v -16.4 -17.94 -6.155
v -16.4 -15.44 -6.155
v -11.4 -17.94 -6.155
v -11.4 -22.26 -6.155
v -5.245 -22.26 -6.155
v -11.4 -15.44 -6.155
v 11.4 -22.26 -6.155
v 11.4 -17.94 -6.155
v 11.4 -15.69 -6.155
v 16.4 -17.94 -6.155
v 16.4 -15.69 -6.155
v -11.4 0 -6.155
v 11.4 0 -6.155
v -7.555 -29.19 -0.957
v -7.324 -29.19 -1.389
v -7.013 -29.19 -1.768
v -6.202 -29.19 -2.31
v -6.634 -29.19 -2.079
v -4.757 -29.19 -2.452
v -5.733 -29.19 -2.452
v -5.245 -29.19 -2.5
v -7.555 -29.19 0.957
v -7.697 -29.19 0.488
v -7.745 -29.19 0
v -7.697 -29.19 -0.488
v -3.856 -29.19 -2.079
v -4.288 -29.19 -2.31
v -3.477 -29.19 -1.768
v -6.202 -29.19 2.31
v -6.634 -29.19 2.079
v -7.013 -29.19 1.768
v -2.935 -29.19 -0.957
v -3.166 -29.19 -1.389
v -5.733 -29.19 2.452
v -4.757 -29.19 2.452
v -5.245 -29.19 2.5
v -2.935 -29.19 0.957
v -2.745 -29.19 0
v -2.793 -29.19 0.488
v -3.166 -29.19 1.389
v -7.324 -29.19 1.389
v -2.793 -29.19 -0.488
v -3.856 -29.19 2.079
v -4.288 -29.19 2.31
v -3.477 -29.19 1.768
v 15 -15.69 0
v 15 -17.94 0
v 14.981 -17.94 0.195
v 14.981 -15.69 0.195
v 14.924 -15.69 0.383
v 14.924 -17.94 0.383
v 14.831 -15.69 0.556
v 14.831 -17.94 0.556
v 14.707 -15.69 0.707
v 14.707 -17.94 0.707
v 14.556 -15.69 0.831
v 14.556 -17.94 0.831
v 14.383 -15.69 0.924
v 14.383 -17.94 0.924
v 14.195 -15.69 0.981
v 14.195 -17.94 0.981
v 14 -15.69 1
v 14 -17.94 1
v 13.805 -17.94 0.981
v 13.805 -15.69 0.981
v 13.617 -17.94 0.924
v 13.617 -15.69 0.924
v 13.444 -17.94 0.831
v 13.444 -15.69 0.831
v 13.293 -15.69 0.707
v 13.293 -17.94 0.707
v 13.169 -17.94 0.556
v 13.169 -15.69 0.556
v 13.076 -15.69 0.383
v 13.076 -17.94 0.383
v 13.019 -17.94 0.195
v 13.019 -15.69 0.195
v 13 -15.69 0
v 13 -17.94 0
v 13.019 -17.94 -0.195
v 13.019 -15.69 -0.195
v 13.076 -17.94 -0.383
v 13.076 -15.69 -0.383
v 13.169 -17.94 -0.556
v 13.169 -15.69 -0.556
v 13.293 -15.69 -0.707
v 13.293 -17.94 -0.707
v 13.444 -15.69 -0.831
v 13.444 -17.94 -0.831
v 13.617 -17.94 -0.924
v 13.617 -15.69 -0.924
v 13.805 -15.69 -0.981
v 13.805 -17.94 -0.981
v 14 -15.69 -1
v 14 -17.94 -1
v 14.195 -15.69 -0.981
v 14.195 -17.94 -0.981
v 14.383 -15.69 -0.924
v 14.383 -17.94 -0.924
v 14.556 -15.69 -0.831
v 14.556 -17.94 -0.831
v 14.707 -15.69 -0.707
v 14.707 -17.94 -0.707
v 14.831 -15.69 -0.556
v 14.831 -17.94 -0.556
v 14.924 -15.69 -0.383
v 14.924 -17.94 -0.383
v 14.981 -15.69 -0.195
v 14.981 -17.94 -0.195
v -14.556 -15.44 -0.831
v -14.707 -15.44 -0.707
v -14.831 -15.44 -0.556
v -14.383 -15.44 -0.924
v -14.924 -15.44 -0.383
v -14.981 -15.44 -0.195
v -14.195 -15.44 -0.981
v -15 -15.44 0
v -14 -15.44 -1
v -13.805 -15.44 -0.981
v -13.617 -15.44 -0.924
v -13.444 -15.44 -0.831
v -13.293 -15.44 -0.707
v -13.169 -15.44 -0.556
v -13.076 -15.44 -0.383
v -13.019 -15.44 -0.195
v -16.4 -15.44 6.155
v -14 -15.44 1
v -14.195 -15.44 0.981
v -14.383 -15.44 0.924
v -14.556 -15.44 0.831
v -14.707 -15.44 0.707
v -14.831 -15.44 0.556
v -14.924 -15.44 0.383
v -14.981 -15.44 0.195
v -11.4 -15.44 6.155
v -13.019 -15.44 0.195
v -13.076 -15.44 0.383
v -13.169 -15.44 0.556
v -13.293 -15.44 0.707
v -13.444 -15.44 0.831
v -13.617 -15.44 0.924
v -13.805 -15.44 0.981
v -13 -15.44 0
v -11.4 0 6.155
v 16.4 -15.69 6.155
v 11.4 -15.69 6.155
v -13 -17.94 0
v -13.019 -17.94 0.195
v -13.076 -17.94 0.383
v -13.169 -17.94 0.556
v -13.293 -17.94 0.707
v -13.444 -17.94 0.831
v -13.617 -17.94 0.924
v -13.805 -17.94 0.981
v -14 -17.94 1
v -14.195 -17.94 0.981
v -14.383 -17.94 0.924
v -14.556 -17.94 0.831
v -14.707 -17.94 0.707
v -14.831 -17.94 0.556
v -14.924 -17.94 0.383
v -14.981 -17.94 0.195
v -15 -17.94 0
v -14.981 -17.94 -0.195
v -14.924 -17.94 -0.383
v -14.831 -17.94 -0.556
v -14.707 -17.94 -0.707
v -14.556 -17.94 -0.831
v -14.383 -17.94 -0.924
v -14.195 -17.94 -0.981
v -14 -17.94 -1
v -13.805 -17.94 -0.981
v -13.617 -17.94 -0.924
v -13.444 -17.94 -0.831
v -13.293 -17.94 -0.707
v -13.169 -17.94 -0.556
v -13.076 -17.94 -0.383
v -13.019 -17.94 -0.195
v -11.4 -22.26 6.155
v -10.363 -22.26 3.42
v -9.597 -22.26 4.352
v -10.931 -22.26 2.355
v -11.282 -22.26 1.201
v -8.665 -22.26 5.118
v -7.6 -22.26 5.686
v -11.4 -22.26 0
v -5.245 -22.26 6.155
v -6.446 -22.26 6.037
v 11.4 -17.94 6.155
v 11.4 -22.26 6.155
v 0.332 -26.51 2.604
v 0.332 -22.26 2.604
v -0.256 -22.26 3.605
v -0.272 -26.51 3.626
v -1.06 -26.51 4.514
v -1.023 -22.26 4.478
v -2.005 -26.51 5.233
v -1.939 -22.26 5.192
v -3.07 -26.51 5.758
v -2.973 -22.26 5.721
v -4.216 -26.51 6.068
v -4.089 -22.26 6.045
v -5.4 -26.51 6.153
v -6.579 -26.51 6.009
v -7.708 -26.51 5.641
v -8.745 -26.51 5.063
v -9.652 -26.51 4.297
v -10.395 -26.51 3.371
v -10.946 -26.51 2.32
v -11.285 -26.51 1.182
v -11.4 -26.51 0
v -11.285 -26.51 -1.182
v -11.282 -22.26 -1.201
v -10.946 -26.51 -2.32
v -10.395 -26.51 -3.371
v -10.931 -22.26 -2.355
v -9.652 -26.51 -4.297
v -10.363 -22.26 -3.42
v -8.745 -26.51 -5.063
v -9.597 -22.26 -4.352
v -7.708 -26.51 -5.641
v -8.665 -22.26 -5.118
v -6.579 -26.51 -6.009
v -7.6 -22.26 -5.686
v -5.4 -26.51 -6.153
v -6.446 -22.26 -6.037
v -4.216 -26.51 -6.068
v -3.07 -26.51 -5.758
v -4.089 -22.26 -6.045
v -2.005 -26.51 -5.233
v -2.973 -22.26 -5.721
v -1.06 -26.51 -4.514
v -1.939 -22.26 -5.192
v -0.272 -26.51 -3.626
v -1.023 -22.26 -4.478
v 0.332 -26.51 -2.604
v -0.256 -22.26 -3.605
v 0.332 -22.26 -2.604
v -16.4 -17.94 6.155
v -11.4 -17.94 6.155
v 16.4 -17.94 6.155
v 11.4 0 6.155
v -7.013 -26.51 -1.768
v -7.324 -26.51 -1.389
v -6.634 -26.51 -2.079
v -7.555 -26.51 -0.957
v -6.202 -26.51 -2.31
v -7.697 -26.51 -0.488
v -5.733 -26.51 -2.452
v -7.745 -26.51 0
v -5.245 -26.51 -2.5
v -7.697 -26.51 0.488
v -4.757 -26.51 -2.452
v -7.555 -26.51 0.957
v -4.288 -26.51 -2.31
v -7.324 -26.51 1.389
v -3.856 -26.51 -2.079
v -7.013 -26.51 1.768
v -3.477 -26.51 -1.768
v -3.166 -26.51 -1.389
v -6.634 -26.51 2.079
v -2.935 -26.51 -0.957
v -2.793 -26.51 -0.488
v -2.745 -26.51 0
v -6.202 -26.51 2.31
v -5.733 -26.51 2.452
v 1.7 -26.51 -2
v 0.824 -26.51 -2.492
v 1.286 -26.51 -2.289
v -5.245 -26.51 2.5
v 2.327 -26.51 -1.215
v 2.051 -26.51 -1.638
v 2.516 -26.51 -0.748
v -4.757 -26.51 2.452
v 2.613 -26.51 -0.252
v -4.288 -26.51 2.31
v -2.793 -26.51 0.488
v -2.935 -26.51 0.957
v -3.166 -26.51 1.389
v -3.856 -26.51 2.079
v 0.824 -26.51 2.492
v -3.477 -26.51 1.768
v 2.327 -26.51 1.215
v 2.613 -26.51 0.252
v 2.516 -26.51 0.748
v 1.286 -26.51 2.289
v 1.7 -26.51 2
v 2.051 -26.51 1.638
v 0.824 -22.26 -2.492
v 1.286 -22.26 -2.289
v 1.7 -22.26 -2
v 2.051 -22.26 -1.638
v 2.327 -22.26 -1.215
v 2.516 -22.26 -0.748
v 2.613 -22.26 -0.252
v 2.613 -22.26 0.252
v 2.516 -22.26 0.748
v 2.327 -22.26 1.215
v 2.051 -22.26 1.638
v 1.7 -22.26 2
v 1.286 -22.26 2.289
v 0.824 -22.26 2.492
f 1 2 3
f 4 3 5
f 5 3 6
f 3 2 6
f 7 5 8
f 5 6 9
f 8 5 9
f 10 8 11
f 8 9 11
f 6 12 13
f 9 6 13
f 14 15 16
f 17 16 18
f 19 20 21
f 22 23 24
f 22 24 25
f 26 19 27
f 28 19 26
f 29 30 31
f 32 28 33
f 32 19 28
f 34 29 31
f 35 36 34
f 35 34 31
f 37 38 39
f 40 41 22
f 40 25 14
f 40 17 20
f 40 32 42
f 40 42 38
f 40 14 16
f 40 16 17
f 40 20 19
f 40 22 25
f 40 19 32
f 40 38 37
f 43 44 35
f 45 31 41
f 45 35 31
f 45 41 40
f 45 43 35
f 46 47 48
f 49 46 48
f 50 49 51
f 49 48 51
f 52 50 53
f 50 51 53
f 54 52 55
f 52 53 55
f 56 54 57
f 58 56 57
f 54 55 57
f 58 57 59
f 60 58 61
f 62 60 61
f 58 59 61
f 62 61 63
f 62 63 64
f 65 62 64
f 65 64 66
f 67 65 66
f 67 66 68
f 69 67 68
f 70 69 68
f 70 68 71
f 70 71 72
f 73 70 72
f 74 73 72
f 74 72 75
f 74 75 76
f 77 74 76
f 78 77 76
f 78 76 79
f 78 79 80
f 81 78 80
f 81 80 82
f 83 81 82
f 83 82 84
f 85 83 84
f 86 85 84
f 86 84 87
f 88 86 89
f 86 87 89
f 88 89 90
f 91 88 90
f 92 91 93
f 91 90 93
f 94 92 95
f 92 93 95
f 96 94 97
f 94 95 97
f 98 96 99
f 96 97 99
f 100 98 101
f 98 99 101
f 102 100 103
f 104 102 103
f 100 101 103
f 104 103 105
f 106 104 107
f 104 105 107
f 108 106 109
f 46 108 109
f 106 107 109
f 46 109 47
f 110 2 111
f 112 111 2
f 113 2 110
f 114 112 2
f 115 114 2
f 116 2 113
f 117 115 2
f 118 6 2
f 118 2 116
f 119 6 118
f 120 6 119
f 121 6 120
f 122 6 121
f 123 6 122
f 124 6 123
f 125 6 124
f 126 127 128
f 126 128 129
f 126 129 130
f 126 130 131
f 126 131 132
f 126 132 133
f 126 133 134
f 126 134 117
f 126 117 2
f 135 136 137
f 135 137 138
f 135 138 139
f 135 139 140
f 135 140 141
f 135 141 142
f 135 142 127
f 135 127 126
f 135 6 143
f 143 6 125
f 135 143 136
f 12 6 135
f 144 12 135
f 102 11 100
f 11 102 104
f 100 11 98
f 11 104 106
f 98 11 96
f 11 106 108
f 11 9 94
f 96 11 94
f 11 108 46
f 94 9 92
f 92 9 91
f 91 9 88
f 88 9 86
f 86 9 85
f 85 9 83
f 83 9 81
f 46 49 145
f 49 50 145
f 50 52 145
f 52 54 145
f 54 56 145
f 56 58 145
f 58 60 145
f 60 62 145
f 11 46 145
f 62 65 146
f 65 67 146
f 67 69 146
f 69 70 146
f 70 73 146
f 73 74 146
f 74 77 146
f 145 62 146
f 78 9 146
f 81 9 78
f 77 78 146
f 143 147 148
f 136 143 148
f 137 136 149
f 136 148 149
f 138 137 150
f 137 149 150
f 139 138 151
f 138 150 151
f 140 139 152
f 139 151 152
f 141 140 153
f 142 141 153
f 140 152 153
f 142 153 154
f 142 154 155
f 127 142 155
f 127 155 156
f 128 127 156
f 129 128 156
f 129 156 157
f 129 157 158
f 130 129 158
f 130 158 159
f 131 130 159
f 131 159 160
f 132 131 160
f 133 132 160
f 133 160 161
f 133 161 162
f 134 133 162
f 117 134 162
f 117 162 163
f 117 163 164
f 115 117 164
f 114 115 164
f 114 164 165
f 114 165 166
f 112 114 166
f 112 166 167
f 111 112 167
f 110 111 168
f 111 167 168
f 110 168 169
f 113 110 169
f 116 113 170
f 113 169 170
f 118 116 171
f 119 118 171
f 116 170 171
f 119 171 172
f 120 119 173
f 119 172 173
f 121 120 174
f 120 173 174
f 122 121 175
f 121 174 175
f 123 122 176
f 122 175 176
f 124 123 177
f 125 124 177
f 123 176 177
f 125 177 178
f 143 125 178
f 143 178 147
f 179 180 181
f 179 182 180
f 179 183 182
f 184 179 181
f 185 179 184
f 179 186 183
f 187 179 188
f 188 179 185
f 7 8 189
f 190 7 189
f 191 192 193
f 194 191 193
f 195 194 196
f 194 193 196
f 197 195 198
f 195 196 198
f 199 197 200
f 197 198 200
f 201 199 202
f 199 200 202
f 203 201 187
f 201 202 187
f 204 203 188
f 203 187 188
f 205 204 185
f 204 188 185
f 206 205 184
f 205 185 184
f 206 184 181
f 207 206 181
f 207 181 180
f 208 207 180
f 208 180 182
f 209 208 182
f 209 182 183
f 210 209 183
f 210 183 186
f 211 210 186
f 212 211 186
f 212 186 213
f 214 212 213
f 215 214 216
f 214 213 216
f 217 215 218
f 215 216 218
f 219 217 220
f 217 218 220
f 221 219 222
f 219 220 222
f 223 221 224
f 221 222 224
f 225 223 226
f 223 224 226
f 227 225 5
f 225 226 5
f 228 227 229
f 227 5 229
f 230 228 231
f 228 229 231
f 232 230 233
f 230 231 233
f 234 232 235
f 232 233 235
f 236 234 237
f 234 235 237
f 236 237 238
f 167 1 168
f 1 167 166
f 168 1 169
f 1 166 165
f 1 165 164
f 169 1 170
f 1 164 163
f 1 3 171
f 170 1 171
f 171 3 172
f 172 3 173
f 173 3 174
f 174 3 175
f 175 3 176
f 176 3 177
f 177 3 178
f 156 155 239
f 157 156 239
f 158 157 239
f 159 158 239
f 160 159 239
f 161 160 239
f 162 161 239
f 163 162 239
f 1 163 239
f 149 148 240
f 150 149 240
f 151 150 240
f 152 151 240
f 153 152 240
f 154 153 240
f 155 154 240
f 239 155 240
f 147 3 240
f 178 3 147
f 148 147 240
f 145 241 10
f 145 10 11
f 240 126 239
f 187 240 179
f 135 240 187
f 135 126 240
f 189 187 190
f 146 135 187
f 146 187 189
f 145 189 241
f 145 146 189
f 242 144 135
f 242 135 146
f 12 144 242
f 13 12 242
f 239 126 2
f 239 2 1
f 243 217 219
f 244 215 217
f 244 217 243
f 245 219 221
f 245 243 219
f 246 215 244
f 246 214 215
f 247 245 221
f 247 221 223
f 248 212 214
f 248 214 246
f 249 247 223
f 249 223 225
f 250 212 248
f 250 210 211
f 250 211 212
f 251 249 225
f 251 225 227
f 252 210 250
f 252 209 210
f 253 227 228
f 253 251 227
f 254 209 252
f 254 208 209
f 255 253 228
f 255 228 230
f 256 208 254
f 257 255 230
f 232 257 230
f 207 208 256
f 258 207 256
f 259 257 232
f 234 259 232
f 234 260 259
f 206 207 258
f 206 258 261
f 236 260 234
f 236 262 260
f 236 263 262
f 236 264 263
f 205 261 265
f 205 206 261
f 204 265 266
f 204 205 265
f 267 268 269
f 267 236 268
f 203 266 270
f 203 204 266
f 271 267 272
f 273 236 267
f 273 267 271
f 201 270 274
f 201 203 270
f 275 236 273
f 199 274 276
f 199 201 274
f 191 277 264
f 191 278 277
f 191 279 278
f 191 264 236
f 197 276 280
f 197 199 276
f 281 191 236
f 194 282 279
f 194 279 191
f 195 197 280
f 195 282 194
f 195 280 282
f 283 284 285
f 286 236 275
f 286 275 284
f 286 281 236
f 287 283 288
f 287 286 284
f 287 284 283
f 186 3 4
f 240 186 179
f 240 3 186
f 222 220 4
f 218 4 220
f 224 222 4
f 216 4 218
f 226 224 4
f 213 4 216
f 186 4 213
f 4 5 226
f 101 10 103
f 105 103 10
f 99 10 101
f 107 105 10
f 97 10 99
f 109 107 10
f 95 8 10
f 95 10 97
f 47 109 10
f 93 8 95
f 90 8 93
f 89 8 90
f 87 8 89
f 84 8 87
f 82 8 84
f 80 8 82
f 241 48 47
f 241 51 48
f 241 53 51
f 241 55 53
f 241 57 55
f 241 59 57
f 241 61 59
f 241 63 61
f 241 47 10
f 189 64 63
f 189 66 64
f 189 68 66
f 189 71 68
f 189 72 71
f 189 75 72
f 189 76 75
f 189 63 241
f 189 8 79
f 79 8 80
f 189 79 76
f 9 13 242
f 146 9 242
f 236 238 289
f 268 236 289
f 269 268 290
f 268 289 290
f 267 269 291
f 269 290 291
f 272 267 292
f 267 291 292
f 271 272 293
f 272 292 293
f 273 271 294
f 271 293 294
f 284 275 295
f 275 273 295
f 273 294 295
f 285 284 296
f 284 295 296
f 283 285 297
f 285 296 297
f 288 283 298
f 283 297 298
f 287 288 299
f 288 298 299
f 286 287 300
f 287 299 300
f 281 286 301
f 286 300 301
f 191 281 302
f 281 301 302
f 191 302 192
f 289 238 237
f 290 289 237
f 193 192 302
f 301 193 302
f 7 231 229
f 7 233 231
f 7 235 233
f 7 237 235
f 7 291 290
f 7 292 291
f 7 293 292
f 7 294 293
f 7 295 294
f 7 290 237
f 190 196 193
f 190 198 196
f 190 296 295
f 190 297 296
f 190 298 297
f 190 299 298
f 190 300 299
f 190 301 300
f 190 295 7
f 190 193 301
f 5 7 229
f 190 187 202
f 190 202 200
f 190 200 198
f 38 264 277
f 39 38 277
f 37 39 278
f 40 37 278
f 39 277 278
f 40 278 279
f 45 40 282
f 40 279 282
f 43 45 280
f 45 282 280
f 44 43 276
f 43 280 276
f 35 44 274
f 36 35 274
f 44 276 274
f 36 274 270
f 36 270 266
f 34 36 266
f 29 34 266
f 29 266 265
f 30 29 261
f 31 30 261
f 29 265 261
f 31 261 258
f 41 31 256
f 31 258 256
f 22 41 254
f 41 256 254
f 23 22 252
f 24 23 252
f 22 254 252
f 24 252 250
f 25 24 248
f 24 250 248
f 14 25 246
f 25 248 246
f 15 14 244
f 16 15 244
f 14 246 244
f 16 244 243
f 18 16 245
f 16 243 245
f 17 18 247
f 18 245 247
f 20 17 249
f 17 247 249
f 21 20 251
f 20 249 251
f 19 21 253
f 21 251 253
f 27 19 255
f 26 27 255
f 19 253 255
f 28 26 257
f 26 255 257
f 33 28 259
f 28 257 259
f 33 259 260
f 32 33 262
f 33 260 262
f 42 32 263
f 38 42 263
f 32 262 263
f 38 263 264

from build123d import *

# Parameters (mm, degrees)
F0_W      = 22.8
F0_H      = 12.31
F1_DEPTH  = 22.26
F2_R      = 6.155
F3_DEPTH  = 4.25
F4_R      = 2.625
F5_DEPTH  = 4.25
F6_W      = 2.5
F6_H      = 12.31
F7_DEPTH  = 5
F8_W      = 2.25
F8_H      = 12.31
F9_DEPTH  = 5
F10_R     = 2.5
F11_DEPTH = 2.68
F12_R     = 1
F13_DEPTH = 25


with BuildPart() as f1:
    # F0 (on Front) → F1 (new body)
    with BuildSketch(Plane.XZ):
        Rectangle(F0_W, F0_H)
    extrude(amount=F1_DEPTH)

    # F2 (on face) → F3 (join)
    with BuildSketch(Plane.XZ.offset(22.26)):
        with Locations((-5.245, 0)):
            Circle(F2_R)
    extrude(amount=F3_DEPTH)

    # F4 (on face) → F5 (join)
    with BuildSketch(Plane.XZ.offset(22.26)):
        Circle(F4_R)
    extrude(amount=F5_DEPTH)

    # F6 (on face) → F7 (join)
    with BuildSketch(Plane(origin=(-11.4, 0, 0), x_dir=(0, -1, 0), z_dir=(-1, 0, 0))):
        with Locations((16.69, 0)):
            Rectangle(F6_W, F6_H)
    extrude(amount=F7_DEPTH)

    # F8 (on face) → F9 (join)
    with BuildSketch(Plane.YZ.offset(11.4)):
        with Locations((-16.815, 0)):
            Rectangle(F8_W, F8_H)
    extrude(amount=F9_DEPTH)

    # F10 (on face) → F11 (join)
    with BuildSketch(Plane.XZ.offset(26.51)):
        with Locations((-5.245, 0)):
            Circle(F10_R)
    extrude(amount=F11_DEPTH)

    # F12 (on face) → F13 (cut)
    with BuildSketch(Plane.XZ.offset(17.94)):
        with Locations((-14, 0)):
            Circle(F12_R)
        with Locations((14, 0)):
            Circle(F12_R)
    extrude(amount=-F13_DEPTH, mode=Mode.SUBTRACT)


solid = f1.part
